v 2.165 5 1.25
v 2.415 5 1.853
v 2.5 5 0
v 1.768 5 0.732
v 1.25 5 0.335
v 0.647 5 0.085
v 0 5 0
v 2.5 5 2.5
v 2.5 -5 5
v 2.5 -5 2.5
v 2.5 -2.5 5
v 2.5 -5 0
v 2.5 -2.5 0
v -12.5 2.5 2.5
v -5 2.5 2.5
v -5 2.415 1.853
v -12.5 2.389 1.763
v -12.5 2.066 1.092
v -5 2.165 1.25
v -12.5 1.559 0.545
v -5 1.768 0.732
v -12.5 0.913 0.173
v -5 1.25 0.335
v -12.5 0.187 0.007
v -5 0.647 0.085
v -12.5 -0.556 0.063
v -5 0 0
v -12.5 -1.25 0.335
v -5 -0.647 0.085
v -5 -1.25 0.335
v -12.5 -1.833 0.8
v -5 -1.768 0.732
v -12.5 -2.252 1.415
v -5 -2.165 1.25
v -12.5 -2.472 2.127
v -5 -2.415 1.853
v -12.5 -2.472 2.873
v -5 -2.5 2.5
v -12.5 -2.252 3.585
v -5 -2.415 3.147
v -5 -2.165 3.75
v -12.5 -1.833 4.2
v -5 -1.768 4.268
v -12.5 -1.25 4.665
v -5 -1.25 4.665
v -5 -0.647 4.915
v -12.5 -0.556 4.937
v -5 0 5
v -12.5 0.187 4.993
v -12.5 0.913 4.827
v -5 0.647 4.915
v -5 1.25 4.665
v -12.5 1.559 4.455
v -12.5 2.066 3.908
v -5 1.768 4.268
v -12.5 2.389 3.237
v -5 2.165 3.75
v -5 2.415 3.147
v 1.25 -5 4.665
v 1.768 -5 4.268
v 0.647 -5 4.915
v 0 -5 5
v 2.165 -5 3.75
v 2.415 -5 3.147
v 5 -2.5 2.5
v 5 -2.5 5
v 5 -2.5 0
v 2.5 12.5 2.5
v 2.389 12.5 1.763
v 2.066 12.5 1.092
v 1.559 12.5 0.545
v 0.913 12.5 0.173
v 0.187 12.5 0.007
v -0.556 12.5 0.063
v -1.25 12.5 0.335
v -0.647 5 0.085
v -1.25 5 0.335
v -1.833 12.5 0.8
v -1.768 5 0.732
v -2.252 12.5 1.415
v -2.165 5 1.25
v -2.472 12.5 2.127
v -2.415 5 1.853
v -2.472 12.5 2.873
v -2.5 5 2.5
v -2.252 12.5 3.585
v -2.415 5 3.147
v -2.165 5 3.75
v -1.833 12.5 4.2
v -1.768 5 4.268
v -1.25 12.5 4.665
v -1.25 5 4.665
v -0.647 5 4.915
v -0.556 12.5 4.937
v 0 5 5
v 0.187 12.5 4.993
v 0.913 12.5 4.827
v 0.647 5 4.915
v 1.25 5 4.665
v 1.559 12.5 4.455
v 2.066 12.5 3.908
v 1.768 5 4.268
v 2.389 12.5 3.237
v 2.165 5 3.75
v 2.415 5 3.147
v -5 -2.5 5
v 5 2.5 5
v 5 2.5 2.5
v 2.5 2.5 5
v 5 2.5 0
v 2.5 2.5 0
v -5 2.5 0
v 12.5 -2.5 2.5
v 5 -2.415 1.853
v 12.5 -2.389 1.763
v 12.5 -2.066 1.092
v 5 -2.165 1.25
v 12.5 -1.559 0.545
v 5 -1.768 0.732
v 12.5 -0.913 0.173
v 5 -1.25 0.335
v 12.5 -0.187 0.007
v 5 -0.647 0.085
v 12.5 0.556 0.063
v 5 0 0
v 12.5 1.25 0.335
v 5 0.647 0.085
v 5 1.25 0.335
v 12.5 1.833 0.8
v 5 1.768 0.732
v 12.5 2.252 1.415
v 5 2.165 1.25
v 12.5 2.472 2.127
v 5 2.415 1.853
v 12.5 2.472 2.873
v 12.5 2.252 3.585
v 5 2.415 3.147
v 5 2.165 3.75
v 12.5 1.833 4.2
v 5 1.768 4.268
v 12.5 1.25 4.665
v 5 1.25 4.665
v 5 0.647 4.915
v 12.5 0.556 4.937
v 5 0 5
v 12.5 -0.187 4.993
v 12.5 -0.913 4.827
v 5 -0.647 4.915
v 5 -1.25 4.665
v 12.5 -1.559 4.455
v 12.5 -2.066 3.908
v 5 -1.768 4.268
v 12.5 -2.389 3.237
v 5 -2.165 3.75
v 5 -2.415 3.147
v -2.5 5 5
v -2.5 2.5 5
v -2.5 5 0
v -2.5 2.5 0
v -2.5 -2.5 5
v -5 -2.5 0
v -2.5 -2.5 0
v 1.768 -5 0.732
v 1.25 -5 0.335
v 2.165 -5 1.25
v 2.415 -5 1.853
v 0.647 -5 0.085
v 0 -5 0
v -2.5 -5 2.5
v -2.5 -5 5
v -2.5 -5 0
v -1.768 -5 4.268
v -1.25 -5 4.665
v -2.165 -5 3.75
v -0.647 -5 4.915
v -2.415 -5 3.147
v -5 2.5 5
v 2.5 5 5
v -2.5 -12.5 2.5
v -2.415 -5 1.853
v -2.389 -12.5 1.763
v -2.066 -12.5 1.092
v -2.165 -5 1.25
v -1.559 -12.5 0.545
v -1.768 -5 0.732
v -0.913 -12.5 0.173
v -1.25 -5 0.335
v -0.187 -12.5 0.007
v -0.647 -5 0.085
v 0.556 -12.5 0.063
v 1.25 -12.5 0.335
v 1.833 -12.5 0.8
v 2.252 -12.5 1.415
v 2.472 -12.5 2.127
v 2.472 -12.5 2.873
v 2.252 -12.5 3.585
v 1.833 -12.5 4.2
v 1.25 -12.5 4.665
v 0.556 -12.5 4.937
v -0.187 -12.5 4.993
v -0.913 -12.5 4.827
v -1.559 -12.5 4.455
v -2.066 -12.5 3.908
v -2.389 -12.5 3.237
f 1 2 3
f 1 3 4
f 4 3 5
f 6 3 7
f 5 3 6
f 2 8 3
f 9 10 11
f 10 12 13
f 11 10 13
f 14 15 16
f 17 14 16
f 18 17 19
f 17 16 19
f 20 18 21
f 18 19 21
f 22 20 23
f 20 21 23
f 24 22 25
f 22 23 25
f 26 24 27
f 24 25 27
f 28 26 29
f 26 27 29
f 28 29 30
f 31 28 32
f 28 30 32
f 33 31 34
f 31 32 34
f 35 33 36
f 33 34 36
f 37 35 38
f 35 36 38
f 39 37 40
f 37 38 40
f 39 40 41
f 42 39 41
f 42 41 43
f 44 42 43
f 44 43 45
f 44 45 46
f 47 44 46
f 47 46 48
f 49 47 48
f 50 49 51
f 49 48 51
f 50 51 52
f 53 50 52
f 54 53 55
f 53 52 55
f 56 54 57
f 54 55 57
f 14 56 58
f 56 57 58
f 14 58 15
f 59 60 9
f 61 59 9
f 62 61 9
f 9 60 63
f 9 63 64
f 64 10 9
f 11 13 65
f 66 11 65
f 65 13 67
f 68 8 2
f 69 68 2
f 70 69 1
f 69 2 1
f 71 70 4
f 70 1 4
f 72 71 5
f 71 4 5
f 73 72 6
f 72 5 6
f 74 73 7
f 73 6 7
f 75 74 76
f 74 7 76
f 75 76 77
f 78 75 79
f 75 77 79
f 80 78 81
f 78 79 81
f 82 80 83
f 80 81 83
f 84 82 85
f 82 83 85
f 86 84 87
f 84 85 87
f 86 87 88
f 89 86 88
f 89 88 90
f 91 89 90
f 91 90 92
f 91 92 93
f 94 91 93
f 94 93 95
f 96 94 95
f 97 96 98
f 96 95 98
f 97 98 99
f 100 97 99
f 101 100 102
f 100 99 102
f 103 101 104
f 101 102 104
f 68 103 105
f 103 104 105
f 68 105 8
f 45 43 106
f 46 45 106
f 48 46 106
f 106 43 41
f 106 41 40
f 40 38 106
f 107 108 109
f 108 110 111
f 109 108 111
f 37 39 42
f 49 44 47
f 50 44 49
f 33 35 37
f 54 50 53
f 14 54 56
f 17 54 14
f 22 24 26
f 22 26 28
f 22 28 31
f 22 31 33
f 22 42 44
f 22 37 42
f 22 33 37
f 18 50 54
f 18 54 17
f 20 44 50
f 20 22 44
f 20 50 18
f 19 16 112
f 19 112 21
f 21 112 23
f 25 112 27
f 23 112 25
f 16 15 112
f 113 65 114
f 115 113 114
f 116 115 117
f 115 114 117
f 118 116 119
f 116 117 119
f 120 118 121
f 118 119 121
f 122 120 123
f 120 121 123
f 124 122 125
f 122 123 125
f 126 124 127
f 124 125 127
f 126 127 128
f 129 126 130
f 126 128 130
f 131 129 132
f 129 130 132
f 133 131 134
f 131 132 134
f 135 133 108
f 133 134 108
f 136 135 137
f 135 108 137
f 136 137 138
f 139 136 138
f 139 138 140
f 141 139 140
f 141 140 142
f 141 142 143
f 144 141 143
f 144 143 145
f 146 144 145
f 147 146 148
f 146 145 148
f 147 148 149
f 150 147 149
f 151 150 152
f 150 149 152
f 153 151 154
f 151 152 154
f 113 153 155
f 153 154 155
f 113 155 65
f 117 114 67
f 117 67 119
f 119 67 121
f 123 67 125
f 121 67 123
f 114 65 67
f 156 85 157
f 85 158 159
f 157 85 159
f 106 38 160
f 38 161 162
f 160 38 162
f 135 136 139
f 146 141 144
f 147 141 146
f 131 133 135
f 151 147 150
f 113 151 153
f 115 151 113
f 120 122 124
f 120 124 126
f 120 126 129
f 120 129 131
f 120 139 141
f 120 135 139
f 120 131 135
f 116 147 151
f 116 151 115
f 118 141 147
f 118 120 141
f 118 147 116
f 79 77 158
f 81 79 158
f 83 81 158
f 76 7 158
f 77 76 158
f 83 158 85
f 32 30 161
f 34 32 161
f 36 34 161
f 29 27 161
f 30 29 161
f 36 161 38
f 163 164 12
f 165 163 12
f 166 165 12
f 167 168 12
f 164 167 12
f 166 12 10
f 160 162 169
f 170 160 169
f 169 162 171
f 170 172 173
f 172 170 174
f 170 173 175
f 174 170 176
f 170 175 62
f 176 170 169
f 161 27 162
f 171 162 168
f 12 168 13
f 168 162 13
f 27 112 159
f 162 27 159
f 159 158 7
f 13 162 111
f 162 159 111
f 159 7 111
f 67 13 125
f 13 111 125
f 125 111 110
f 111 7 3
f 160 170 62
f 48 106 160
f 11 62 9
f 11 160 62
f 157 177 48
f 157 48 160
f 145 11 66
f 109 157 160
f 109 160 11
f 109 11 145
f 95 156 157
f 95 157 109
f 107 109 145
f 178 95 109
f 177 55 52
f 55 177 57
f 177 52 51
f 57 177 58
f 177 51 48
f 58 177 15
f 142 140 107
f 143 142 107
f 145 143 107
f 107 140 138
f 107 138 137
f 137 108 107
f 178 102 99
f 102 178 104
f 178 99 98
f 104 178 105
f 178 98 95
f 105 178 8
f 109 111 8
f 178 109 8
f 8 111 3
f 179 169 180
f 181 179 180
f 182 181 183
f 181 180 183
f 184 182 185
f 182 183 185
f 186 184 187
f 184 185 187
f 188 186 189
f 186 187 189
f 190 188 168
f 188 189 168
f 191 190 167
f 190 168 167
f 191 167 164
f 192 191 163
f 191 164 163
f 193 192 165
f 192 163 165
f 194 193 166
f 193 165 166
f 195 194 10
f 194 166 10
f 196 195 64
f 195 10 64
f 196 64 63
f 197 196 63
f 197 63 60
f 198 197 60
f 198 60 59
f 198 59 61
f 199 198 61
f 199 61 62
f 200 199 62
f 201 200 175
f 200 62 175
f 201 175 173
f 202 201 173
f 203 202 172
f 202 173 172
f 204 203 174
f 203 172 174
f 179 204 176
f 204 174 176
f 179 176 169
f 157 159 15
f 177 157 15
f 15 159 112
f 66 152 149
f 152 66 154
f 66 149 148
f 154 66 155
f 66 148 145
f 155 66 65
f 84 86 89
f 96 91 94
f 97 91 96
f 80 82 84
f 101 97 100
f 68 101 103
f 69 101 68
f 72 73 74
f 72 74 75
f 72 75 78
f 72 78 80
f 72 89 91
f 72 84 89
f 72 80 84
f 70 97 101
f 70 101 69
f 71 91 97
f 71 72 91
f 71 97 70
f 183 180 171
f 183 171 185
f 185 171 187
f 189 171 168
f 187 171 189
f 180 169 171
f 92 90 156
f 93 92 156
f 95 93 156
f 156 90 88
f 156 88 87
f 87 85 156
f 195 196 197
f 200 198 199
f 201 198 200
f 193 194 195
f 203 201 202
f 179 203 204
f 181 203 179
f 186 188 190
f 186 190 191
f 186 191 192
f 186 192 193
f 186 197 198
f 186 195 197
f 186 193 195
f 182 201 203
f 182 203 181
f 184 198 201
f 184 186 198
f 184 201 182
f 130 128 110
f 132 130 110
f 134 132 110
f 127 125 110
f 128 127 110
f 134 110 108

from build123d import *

# Parameters (mm, degrees)
BOSS_EXTRUDE1_DEPTH = 5
SKETCH2_R           = 2.5
BOSS_EXTRUDE2_DEPTH = 7.5
CIRPATTERN1_COUNT   = 4


with BuildPart() as part:
    # Sketch1 → Boss-Extrude1 (new body)
    with BuildSketch(Plane.XY):
        Polygon((-2.5, 2.5), (-5, 2.5), (-5, -2.5), (-2.5, -2.5), (-2.5, -5), (2.5, -5), (2.5, -2.5), (5, -2.5), (5, 2.5), (2.5, 2.5), (2.5, 5), (-2.5, 5), align=None)
    extrude(amount=BOSS_EXTRUDE1_DEPTH)

    # Sketch2 → Boss-Extrude2 (add)
    with BuildSketch(Plane(origin=(0, 5, 0), x_dir=(1, 0, 0), z_dir=(0, 1, 0))):
        with Locations((0, -2.5)):
            Circle(SKETCH2_R)
    boss_extrude2 = extrude(amount=BOSS_EXTRUDE2_DEPTH)

    # CirPattern1: Boss-Extrude2 ×4 about axis
    cirpattern1_axis = Axis((0, 0, 0), (0, 0, 1))
    for i in range(1, CIRPATTERN1_COUNT):
        add(boss_extrude2.rotate(cirpattern1_axis, i * 360 / CIRPATTERN1_COUNT))


solid = part.part
